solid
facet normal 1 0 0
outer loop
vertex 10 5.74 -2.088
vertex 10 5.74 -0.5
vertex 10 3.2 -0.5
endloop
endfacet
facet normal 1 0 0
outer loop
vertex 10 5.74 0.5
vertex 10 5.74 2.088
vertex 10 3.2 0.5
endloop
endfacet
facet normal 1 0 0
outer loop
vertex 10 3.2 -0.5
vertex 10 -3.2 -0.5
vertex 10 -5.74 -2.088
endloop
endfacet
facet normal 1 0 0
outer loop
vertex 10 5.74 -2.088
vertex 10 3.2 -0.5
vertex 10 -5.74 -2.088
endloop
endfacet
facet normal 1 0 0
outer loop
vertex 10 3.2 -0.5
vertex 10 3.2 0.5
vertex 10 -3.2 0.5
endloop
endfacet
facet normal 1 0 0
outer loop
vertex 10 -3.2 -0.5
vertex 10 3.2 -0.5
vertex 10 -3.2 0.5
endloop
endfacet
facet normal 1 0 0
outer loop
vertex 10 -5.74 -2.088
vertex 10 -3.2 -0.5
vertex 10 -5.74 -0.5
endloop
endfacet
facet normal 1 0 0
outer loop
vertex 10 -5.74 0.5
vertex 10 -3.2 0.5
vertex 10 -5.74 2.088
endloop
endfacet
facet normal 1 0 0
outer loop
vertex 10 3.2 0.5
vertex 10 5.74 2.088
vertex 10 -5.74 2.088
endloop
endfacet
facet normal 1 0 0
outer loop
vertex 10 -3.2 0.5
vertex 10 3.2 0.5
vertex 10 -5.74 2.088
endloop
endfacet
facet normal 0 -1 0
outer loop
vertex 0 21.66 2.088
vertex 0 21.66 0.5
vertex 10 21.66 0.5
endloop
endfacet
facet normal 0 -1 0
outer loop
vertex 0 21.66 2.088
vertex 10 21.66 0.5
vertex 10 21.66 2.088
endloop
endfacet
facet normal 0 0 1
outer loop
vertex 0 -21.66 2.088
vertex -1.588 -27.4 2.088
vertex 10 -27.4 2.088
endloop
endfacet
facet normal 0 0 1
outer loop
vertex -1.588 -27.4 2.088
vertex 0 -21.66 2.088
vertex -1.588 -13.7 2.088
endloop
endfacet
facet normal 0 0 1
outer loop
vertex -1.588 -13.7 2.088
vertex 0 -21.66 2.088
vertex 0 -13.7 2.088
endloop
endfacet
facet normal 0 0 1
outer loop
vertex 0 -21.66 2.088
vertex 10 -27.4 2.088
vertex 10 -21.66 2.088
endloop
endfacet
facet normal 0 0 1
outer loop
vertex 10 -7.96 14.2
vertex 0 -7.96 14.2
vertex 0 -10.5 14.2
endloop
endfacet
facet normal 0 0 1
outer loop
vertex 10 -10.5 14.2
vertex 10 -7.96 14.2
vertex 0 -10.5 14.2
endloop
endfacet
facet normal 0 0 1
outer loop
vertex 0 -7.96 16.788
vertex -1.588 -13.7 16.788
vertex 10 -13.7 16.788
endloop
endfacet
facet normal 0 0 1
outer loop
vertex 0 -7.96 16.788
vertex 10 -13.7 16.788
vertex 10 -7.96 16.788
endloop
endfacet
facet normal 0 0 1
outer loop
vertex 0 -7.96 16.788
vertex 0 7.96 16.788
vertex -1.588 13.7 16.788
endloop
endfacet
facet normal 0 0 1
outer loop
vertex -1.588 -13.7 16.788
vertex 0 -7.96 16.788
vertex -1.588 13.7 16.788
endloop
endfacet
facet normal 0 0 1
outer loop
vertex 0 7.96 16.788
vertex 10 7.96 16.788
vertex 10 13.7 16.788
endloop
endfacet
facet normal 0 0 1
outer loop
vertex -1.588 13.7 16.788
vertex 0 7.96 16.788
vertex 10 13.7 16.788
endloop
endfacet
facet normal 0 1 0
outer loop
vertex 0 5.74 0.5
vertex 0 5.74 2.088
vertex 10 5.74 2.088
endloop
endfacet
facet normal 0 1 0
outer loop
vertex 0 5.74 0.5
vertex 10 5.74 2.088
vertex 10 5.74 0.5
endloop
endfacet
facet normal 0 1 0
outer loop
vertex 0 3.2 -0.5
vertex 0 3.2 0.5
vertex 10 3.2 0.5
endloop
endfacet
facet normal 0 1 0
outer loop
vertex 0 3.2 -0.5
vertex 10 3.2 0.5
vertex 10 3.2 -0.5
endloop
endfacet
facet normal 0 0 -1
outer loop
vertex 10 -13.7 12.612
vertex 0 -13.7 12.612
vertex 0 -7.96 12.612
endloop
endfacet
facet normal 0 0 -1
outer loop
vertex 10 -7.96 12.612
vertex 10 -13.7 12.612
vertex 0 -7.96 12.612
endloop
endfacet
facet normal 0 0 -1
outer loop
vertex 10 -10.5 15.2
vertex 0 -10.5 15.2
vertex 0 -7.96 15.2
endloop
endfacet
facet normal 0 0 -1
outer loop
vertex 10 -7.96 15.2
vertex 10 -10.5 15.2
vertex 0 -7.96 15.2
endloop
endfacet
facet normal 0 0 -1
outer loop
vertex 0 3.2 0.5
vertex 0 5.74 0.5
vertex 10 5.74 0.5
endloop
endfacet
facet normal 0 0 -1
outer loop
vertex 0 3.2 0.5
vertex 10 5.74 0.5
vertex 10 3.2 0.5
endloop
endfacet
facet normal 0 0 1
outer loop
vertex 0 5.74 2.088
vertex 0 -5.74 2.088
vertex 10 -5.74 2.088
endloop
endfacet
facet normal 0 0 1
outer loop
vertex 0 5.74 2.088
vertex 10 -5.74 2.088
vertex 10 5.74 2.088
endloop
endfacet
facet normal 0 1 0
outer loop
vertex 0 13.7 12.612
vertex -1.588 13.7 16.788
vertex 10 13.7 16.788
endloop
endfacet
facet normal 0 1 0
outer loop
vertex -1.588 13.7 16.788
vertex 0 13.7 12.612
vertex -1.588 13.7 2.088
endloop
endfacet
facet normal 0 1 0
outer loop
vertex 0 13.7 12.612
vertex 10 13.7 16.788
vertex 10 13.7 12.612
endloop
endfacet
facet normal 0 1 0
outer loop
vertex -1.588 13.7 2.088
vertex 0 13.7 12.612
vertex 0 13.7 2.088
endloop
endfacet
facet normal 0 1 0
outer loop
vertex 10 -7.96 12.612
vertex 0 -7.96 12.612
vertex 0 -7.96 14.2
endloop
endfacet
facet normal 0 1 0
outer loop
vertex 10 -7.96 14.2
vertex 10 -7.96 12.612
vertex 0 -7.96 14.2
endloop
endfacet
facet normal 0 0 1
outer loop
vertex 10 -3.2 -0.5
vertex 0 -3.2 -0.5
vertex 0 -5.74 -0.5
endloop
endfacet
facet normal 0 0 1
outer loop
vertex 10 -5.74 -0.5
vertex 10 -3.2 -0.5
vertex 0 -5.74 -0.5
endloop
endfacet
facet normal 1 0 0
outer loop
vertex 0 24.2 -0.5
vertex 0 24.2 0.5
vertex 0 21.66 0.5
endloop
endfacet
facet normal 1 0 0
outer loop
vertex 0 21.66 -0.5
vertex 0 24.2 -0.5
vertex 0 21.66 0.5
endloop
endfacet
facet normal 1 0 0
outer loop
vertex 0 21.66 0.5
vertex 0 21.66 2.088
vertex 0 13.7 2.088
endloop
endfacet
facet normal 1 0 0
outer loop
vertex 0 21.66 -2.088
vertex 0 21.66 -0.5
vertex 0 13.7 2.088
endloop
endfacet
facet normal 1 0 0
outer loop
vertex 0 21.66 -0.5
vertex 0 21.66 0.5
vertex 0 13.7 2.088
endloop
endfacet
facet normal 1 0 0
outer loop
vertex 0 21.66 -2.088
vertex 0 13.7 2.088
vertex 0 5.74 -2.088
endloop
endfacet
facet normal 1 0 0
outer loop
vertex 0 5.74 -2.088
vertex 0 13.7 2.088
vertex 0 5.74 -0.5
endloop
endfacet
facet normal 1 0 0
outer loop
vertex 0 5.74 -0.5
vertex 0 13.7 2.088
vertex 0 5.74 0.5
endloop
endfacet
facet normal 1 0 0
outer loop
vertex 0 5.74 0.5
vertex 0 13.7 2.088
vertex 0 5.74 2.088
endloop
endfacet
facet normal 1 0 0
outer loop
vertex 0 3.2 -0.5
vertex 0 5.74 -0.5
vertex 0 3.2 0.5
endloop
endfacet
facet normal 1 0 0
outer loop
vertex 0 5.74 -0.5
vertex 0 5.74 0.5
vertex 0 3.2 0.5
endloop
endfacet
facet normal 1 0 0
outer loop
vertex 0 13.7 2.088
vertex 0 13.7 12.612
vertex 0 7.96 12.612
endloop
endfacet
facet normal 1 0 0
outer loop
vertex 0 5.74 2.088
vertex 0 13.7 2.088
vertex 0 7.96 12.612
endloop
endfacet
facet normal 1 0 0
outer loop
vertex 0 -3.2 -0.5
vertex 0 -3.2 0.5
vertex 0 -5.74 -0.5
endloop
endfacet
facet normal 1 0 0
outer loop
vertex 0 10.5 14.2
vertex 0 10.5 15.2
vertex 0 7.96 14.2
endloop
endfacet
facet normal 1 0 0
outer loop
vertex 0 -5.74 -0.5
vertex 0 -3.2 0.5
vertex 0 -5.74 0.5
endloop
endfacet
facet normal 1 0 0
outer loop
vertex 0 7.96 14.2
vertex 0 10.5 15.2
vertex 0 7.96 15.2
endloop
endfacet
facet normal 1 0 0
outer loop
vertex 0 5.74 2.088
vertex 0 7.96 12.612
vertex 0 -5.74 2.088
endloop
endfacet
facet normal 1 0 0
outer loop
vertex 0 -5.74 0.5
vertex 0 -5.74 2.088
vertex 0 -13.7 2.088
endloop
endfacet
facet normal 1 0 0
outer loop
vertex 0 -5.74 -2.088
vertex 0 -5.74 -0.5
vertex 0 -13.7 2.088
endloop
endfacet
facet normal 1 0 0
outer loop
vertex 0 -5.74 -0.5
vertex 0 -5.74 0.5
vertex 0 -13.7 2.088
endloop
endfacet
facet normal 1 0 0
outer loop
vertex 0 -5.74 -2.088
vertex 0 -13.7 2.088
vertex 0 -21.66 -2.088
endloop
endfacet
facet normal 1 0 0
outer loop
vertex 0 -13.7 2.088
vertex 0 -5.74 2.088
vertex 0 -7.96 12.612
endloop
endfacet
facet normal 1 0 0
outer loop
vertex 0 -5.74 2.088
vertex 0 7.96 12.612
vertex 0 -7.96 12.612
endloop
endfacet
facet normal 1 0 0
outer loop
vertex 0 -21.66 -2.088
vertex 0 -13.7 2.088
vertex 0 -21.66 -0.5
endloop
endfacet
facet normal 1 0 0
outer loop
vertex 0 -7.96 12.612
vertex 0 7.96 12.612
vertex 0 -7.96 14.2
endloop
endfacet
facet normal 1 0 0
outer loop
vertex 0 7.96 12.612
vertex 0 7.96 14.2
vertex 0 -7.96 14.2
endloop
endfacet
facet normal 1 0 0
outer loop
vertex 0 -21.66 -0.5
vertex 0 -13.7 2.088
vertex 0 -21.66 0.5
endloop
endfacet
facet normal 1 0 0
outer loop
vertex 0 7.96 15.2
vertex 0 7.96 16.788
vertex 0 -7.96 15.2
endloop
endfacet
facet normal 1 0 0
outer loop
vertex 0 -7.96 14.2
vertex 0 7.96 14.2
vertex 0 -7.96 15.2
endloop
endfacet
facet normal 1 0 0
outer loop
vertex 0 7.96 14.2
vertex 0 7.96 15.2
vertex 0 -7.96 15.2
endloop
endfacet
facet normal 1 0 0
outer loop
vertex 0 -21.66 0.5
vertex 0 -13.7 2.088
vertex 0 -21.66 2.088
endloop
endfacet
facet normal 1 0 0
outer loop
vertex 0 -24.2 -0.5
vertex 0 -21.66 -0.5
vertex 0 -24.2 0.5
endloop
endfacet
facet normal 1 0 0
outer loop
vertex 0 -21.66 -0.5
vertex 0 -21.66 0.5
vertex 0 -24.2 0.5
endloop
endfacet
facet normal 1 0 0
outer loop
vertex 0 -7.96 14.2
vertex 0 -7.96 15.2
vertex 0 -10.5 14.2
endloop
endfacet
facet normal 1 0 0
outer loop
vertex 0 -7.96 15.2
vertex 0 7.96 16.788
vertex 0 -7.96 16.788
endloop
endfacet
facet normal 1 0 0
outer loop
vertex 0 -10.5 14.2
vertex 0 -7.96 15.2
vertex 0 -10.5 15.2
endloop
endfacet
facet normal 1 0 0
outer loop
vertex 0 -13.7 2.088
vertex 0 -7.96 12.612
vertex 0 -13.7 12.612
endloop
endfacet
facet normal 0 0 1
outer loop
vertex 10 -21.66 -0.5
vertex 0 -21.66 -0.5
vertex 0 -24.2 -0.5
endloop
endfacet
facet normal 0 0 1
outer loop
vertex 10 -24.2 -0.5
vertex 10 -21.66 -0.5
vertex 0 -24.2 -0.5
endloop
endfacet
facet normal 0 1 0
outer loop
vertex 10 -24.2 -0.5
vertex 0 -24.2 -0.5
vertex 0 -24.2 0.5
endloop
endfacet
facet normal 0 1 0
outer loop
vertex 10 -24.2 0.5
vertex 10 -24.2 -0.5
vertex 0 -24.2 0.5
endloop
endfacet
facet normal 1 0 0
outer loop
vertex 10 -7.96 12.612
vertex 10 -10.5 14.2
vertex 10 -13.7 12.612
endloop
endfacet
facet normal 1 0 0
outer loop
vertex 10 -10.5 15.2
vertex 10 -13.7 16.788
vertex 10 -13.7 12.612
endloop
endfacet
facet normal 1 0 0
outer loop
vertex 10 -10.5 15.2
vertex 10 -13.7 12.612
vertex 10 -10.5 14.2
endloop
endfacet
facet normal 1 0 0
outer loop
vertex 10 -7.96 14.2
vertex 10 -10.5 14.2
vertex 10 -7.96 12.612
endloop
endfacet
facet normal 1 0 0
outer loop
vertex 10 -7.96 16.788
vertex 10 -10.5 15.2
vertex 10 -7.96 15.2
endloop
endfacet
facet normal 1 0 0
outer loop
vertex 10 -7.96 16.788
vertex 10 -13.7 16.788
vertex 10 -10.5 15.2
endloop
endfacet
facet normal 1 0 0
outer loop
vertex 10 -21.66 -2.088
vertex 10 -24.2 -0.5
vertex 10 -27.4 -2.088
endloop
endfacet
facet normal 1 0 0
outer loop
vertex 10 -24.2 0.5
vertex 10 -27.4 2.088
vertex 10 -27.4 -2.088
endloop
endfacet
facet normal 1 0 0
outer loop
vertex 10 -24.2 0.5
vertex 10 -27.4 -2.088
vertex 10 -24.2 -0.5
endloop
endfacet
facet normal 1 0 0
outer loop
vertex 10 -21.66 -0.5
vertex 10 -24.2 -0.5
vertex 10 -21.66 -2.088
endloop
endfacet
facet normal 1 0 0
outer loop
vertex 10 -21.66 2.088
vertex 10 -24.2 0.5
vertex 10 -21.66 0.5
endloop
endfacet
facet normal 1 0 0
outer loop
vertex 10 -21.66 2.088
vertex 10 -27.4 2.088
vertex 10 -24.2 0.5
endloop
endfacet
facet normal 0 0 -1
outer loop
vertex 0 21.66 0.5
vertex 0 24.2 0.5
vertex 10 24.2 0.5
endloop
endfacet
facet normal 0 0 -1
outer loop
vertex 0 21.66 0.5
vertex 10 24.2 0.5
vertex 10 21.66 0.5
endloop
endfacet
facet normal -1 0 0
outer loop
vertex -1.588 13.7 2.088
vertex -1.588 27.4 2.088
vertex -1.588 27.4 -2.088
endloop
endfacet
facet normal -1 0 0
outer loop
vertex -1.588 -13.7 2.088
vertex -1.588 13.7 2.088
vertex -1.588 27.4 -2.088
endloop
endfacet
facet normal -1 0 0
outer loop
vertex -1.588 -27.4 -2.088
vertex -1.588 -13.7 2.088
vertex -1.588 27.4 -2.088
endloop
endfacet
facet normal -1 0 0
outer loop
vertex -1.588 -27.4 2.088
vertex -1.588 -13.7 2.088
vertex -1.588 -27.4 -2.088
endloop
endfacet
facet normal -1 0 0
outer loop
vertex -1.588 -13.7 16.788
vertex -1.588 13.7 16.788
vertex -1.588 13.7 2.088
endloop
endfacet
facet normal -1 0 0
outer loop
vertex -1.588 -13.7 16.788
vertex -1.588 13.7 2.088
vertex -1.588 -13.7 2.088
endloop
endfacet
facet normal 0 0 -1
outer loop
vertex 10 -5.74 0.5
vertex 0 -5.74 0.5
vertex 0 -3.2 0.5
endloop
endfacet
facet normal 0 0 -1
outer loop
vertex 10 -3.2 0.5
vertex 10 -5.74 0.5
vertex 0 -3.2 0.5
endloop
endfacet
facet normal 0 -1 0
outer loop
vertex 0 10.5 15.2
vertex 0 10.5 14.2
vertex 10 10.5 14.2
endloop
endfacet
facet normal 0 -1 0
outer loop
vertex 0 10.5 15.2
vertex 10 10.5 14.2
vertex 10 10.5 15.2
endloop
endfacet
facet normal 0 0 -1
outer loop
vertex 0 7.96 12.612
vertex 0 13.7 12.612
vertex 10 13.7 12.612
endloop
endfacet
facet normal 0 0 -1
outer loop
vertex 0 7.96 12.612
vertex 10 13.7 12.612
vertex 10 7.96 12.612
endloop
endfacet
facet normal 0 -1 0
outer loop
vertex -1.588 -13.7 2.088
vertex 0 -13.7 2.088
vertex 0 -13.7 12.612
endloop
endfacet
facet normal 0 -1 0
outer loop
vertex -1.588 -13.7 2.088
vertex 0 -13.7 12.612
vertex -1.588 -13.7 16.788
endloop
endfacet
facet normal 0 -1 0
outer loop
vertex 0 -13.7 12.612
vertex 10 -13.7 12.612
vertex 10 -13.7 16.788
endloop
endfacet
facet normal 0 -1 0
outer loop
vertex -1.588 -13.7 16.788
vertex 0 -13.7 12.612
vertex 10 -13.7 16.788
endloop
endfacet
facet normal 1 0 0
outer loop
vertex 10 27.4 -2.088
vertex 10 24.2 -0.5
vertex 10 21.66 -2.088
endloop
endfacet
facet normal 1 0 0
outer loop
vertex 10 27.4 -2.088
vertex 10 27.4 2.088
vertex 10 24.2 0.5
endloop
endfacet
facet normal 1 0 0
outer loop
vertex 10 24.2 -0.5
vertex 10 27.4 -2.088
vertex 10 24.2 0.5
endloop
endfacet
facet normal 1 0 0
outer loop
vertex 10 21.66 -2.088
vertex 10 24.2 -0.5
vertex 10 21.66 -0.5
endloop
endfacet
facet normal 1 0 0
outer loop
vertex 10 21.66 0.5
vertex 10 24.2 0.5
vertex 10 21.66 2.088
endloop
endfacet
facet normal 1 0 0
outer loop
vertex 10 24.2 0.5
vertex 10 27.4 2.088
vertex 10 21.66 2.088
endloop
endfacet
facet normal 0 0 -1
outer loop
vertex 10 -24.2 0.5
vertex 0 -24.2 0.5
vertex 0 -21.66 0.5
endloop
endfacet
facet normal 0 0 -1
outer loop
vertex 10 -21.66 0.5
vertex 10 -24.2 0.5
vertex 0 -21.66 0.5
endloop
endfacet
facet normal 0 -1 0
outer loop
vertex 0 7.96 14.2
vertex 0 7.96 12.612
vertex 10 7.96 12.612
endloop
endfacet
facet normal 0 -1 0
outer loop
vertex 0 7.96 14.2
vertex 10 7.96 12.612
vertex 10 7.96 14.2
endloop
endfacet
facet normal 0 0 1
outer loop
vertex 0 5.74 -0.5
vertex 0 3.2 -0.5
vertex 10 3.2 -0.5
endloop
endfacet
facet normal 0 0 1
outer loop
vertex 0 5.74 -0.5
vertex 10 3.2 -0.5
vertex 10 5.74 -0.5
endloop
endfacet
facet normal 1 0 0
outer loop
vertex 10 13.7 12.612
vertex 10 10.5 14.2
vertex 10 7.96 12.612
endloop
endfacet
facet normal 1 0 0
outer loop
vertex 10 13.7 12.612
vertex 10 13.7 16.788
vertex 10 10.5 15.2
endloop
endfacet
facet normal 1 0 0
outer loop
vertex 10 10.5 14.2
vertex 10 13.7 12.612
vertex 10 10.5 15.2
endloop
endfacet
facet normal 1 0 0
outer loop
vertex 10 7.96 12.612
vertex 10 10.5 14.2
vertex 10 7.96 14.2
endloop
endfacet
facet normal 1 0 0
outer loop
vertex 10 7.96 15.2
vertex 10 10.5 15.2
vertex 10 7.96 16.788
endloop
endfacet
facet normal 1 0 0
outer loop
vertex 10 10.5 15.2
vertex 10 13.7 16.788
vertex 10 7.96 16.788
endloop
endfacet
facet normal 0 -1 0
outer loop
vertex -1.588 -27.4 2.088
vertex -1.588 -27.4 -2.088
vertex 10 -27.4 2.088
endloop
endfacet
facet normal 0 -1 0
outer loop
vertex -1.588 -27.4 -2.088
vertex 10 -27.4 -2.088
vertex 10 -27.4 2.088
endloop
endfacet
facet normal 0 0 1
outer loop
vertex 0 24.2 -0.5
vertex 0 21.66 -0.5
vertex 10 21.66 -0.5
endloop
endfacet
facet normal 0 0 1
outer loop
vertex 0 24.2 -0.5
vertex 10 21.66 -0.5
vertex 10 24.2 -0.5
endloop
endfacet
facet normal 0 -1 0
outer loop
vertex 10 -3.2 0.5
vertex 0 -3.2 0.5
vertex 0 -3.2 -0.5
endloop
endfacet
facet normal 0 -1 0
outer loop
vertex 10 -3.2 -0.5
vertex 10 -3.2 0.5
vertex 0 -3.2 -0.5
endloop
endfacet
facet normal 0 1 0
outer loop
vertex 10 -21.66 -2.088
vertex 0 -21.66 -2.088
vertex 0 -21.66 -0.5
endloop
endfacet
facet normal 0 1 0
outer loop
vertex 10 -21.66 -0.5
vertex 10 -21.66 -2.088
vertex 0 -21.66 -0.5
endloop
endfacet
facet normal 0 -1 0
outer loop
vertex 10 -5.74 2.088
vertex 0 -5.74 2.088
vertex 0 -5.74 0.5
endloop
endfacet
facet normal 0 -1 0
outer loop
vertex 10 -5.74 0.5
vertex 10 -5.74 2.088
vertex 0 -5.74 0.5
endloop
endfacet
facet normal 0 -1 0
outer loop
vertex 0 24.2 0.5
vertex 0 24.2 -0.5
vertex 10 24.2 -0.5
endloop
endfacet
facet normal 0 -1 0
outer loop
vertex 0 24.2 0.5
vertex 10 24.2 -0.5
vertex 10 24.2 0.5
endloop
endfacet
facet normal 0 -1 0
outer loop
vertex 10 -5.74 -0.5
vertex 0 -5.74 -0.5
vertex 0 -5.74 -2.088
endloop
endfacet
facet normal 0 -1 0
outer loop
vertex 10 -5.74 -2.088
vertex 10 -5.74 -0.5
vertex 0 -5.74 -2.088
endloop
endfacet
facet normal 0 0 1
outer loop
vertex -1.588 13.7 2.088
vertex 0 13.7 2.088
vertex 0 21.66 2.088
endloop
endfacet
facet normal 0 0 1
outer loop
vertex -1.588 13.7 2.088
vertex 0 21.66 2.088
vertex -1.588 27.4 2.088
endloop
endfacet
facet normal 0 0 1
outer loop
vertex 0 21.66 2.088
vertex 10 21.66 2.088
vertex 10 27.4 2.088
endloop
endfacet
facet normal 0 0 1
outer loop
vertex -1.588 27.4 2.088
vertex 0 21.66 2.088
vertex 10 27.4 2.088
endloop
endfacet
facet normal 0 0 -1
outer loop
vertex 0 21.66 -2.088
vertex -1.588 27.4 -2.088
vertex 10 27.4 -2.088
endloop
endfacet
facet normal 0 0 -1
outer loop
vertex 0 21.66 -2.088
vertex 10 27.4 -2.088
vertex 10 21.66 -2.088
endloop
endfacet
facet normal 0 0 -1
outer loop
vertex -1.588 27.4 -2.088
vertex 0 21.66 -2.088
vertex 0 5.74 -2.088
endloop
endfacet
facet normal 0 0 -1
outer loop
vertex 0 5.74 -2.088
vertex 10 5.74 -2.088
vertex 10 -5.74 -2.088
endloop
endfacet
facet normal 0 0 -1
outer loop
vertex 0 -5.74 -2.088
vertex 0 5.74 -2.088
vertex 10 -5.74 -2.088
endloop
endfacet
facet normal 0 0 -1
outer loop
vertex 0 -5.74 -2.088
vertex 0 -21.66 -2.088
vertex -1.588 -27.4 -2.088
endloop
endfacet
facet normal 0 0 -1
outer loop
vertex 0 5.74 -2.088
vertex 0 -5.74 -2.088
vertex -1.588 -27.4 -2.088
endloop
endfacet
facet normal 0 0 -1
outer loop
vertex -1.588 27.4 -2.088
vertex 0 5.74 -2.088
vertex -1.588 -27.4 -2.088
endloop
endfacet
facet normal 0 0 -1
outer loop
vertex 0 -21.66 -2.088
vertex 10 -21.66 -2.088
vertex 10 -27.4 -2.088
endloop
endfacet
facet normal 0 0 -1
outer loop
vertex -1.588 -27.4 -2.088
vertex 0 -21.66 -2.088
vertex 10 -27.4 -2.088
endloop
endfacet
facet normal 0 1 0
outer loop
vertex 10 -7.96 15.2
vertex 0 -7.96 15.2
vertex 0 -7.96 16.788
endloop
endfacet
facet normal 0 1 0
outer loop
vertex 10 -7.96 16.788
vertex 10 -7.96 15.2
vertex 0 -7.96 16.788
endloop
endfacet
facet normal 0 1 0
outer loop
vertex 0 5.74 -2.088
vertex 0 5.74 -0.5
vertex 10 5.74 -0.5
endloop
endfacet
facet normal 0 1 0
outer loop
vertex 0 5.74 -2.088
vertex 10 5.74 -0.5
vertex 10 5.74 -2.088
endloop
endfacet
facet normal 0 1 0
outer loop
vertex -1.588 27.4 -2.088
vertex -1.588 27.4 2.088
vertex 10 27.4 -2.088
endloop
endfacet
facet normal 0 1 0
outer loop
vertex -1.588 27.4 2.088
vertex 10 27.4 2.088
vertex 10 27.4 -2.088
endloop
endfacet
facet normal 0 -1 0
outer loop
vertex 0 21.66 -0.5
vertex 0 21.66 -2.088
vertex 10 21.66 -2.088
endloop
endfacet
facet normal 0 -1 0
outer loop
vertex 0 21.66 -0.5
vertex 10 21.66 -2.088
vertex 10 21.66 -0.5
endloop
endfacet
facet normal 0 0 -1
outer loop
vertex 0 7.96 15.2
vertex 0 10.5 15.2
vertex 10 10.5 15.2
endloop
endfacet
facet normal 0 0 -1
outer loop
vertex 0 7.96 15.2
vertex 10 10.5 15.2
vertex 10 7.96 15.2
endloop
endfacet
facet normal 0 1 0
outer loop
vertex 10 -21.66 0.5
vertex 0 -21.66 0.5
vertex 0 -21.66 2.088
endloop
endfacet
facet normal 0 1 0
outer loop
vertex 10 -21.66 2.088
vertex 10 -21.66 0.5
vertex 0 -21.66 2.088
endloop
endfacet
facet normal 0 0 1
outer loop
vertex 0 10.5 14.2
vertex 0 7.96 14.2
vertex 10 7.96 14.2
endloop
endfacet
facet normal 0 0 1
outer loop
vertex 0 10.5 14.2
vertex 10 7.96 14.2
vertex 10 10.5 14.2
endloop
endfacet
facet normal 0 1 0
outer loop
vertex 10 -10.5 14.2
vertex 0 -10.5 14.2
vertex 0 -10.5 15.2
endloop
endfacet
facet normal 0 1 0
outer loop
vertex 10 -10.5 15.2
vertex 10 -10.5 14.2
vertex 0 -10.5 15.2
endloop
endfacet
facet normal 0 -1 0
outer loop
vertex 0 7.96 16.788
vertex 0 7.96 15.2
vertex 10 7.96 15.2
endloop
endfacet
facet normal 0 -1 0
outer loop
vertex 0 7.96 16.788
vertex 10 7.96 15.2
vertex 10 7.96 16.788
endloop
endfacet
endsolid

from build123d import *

# Parameters (mm, degrees)
F2_DEPTH = 10
F5_DEPTH = 1.5875


with BuildPart() as f2:
    # F1 (on Right) → F2 (new body)
    with BuildSketch(Plane.YZ):
        Polygon((-10.5, 14.2), (-10.5, 15.2), (-7.96, 15.2), (-7.96, 16.7875), (-13.7, 16.7875), (-13.7, 12.6125), (-7.96, 12.6125), (-7.96, 14.2), align=None)
        Polygon((-24.2, -0.5), (-24.2, 0.5), (-21.66, 0.5), (-21.66, 2.0875), (-27.4, 2.0875), (-27.4, -2.0875), (-21.66, -2.0875), (-21.66, -0.5), align=None)
        Polygon((-5.74, 0.5), (-3.2, 0.5), (-3.2, -0.5), (-5.74, -0.5), (-5.74, -2.0875), (0, -2.0875), (0, 2.0875), (-5.74, 2.0875), align=None)
    extrude(amount=F2_DEPTH)



with BuildPart() as f3_1:
    # F3: instance of F2
    add(f2.part.mirror(Plane.XZ))


with BuildPart() as f2_1:
    add(f2.part)

    add(f3_1.part)  # F5 merges F3_1
    # F4 (on face) → F5 (join)
    with BuildSketch(Plane(origin=(0, 0, 0), x_dir=(0, -1, 0), z_dir=(-1, 0, 0))):
        Polygon((13.7, 16.7875), (-13.7, 16.7875), (-13.7, 2.0875), (-27.4, 2.0875), (-27.4, -2.0875), (27.4, -2.0875), (27.4, 2.0875), (13.7, 2.0875), align=None)
    extrude(amount=F5_DEPTH)


solid = f2_1.part
